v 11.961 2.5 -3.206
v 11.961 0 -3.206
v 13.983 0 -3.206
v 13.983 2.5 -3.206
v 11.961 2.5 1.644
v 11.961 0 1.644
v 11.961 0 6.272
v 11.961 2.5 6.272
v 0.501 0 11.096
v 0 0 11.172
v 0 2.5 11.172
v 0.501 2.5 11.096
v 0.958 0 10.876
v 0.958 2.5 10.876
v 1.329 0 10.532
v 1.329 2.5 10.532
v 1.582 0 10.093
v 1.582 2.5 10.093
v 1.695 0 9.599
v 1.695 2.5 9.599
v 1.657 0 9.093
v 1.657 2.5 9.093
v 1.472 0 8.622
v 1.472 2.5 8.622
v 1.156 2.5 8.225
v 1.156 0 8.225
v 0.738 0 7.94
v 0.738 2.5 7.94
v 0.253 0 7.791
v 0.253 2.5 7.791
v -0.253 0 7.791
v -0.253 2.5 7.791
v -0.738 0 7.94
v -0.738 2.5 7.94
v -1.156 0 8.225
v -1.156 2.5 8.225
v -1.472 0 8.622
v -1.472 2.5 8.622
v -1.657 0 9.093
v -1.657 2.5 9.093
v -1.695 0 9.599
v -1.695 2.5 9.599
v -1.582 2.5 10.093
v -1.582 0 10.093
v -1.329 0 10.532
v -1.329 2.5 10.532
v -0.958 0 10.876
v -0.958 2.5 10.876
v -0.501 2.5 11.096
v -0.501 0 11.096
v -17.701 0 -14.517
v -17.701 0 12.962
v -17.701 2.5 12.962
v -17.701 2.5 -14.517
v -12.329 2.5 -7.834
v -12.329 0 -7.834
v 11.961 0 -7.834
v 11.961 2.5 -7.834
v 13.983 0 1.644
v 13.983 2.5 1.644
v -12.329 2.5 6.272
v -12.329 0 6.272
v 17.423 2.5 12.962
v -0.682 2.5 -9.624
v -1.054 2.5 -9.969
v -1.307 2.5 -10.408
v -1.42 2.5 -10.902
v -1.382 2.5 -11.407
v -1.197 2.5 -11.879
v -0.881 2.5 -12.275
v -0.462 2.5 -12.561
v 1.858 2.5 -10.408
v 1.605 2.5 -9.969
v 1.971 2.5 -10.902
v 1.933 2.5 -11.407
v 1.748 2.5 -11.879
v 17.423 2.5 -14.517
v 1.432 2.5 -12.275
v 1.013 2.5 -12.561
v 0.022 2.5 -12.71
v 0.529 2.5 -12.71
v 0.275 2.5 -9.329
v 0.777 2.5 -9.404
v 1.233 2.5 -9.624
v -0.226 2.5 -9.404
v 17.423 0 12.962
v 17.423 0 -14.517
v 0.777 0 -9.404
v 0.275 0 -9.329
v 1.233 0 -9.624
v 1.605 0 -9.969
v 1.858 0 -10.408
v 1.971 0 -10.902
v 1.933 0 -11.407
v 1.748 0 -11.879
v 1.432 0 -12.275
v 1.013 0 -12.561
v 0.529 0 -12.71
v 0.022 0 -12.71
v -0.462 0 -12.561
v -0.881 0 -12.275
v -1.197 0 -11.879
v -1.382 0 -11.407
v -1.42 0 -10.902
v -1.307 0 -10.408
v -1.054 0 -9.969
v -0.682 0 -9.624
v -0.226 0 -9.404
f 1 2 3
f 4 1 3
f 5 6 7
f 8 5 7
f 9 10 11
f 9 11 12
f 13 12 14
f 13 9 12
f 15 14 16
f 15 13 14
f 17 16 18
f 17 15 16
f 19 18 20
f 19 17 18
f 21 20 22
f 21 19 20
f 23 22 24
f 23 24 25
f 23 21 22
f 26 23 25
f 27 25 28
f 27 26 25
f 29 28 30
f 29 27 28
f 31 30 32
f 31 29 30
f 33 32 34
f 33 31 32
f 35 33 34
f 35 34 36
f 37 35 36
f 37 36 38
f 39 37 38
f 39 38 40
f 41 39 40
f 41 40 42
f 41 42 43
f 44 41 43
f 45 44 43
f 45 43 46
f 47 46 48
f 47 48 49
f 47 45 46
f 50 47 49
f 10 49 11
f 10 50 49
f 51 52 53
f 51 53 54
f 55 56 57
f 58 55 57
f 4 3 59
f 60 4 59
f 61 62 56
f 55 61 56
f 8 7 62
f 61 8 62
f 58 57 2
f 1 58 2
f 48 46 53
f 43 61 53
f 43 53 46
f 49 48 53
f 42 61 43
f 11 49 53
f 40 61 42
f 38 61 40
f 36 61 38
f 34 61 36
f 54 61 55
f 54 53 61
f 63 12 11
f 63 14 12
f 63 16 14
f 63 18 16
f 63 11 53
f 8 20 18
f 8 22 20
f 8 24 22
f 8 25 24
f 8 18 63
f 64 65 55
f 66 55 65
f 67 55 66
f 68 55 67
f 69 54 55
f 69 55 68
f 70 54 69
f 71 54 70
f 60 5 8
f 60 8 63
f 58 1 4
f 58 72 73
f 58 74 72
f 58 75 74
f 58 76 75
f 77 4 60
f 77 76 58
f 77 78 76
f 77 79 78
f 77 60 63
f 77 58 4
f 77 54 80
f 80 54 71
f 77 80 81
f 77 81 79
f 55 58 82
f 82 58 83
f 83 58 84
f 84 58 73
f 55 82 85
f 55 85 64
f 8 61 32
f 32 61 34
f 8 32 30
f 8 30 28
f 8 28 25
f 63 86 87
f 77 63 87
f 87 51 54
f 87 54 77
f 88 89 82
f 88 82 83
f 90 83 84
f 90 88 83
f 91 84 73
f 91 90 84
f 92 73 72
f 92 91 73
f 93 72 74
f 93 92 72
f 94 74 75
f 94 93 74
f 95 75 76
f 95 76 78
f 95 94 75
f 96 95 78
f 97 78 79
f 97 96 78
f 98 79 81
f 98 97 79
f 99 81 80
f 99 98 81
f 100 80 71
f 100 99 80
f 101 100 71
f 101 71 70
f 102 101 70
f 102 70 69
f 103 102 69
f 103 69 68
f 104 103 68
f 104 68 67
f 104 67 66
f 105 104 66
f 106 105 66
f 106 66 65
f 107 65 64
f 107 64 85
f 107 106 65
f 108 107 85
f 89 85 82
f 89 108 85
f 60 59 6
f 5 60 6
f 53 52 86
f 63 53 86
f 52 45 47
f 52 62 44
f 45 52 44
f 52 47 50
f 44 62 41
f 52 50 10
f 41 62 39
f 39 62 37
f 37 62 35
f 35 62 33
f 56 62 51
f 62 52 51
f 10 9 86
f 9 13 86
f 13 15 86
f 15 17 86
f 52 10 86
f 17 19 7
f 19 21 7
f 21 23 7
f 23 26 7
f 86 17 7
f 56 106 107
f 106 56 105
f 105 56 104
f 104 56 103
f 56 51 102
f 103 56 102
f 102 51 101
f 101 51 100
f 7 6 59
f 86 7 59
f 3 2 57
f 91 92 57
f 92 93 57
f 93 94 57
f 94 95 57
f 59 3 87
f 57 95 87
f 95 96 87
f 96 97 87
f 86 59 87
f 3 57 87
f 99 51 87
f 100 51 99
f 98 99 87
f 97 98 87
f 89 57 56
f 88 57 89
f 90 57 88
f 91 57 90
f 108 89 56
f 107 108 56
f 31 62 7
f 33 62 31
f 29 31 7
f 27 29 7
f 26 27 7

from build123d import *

# Parameters (mm, degrees)
SKETCH2_W           = 35.12443
SKETCH2_H           = 27.47815276
SKETCH2_R           = 1.7
BOSS_EXTRUDE2_DEPTH = 2.5


with BuildPart() as part:
    # Sketch2 → Boss-Extrude2 (new body)
    with BuildSketch(Plane(origin=(0, 0, 0), x_dir=(1, 0, 0), z_dir=(0, 1, 0))):
        with Locations((-0.139276638, 0.7775026)):
            Rectangle(SKETCH2_W, SKETCH2_H)
        with Locations(Location((0.275439535, 11.02885898, 0), (0, 0, 270))):
            Circle(SKETCH2_R, mode=Mode.SUBTRACT)
        with Locations(Location((0, -9.47157378, 0), (0, 0, 270))):
            Circle(SKETCH2_R, mode=Mode.SUBTRACT)
        Polygon((-12.329001638, 7.83354898), (11.960588362, 7.83354898), (11.960588362, 3.2058826), (13.982538362, 3.2058826), (13.982538362, -1.6439074), (11.960588362, -1.6439074), (11.960588362, -6.27157378), (-12.329001638, -6.27157378), align=None, mode=Mode.SUBTRACT)
    extrude(amount=BOSS_EXTRUDE2_DEPTH)


solid = part.part
